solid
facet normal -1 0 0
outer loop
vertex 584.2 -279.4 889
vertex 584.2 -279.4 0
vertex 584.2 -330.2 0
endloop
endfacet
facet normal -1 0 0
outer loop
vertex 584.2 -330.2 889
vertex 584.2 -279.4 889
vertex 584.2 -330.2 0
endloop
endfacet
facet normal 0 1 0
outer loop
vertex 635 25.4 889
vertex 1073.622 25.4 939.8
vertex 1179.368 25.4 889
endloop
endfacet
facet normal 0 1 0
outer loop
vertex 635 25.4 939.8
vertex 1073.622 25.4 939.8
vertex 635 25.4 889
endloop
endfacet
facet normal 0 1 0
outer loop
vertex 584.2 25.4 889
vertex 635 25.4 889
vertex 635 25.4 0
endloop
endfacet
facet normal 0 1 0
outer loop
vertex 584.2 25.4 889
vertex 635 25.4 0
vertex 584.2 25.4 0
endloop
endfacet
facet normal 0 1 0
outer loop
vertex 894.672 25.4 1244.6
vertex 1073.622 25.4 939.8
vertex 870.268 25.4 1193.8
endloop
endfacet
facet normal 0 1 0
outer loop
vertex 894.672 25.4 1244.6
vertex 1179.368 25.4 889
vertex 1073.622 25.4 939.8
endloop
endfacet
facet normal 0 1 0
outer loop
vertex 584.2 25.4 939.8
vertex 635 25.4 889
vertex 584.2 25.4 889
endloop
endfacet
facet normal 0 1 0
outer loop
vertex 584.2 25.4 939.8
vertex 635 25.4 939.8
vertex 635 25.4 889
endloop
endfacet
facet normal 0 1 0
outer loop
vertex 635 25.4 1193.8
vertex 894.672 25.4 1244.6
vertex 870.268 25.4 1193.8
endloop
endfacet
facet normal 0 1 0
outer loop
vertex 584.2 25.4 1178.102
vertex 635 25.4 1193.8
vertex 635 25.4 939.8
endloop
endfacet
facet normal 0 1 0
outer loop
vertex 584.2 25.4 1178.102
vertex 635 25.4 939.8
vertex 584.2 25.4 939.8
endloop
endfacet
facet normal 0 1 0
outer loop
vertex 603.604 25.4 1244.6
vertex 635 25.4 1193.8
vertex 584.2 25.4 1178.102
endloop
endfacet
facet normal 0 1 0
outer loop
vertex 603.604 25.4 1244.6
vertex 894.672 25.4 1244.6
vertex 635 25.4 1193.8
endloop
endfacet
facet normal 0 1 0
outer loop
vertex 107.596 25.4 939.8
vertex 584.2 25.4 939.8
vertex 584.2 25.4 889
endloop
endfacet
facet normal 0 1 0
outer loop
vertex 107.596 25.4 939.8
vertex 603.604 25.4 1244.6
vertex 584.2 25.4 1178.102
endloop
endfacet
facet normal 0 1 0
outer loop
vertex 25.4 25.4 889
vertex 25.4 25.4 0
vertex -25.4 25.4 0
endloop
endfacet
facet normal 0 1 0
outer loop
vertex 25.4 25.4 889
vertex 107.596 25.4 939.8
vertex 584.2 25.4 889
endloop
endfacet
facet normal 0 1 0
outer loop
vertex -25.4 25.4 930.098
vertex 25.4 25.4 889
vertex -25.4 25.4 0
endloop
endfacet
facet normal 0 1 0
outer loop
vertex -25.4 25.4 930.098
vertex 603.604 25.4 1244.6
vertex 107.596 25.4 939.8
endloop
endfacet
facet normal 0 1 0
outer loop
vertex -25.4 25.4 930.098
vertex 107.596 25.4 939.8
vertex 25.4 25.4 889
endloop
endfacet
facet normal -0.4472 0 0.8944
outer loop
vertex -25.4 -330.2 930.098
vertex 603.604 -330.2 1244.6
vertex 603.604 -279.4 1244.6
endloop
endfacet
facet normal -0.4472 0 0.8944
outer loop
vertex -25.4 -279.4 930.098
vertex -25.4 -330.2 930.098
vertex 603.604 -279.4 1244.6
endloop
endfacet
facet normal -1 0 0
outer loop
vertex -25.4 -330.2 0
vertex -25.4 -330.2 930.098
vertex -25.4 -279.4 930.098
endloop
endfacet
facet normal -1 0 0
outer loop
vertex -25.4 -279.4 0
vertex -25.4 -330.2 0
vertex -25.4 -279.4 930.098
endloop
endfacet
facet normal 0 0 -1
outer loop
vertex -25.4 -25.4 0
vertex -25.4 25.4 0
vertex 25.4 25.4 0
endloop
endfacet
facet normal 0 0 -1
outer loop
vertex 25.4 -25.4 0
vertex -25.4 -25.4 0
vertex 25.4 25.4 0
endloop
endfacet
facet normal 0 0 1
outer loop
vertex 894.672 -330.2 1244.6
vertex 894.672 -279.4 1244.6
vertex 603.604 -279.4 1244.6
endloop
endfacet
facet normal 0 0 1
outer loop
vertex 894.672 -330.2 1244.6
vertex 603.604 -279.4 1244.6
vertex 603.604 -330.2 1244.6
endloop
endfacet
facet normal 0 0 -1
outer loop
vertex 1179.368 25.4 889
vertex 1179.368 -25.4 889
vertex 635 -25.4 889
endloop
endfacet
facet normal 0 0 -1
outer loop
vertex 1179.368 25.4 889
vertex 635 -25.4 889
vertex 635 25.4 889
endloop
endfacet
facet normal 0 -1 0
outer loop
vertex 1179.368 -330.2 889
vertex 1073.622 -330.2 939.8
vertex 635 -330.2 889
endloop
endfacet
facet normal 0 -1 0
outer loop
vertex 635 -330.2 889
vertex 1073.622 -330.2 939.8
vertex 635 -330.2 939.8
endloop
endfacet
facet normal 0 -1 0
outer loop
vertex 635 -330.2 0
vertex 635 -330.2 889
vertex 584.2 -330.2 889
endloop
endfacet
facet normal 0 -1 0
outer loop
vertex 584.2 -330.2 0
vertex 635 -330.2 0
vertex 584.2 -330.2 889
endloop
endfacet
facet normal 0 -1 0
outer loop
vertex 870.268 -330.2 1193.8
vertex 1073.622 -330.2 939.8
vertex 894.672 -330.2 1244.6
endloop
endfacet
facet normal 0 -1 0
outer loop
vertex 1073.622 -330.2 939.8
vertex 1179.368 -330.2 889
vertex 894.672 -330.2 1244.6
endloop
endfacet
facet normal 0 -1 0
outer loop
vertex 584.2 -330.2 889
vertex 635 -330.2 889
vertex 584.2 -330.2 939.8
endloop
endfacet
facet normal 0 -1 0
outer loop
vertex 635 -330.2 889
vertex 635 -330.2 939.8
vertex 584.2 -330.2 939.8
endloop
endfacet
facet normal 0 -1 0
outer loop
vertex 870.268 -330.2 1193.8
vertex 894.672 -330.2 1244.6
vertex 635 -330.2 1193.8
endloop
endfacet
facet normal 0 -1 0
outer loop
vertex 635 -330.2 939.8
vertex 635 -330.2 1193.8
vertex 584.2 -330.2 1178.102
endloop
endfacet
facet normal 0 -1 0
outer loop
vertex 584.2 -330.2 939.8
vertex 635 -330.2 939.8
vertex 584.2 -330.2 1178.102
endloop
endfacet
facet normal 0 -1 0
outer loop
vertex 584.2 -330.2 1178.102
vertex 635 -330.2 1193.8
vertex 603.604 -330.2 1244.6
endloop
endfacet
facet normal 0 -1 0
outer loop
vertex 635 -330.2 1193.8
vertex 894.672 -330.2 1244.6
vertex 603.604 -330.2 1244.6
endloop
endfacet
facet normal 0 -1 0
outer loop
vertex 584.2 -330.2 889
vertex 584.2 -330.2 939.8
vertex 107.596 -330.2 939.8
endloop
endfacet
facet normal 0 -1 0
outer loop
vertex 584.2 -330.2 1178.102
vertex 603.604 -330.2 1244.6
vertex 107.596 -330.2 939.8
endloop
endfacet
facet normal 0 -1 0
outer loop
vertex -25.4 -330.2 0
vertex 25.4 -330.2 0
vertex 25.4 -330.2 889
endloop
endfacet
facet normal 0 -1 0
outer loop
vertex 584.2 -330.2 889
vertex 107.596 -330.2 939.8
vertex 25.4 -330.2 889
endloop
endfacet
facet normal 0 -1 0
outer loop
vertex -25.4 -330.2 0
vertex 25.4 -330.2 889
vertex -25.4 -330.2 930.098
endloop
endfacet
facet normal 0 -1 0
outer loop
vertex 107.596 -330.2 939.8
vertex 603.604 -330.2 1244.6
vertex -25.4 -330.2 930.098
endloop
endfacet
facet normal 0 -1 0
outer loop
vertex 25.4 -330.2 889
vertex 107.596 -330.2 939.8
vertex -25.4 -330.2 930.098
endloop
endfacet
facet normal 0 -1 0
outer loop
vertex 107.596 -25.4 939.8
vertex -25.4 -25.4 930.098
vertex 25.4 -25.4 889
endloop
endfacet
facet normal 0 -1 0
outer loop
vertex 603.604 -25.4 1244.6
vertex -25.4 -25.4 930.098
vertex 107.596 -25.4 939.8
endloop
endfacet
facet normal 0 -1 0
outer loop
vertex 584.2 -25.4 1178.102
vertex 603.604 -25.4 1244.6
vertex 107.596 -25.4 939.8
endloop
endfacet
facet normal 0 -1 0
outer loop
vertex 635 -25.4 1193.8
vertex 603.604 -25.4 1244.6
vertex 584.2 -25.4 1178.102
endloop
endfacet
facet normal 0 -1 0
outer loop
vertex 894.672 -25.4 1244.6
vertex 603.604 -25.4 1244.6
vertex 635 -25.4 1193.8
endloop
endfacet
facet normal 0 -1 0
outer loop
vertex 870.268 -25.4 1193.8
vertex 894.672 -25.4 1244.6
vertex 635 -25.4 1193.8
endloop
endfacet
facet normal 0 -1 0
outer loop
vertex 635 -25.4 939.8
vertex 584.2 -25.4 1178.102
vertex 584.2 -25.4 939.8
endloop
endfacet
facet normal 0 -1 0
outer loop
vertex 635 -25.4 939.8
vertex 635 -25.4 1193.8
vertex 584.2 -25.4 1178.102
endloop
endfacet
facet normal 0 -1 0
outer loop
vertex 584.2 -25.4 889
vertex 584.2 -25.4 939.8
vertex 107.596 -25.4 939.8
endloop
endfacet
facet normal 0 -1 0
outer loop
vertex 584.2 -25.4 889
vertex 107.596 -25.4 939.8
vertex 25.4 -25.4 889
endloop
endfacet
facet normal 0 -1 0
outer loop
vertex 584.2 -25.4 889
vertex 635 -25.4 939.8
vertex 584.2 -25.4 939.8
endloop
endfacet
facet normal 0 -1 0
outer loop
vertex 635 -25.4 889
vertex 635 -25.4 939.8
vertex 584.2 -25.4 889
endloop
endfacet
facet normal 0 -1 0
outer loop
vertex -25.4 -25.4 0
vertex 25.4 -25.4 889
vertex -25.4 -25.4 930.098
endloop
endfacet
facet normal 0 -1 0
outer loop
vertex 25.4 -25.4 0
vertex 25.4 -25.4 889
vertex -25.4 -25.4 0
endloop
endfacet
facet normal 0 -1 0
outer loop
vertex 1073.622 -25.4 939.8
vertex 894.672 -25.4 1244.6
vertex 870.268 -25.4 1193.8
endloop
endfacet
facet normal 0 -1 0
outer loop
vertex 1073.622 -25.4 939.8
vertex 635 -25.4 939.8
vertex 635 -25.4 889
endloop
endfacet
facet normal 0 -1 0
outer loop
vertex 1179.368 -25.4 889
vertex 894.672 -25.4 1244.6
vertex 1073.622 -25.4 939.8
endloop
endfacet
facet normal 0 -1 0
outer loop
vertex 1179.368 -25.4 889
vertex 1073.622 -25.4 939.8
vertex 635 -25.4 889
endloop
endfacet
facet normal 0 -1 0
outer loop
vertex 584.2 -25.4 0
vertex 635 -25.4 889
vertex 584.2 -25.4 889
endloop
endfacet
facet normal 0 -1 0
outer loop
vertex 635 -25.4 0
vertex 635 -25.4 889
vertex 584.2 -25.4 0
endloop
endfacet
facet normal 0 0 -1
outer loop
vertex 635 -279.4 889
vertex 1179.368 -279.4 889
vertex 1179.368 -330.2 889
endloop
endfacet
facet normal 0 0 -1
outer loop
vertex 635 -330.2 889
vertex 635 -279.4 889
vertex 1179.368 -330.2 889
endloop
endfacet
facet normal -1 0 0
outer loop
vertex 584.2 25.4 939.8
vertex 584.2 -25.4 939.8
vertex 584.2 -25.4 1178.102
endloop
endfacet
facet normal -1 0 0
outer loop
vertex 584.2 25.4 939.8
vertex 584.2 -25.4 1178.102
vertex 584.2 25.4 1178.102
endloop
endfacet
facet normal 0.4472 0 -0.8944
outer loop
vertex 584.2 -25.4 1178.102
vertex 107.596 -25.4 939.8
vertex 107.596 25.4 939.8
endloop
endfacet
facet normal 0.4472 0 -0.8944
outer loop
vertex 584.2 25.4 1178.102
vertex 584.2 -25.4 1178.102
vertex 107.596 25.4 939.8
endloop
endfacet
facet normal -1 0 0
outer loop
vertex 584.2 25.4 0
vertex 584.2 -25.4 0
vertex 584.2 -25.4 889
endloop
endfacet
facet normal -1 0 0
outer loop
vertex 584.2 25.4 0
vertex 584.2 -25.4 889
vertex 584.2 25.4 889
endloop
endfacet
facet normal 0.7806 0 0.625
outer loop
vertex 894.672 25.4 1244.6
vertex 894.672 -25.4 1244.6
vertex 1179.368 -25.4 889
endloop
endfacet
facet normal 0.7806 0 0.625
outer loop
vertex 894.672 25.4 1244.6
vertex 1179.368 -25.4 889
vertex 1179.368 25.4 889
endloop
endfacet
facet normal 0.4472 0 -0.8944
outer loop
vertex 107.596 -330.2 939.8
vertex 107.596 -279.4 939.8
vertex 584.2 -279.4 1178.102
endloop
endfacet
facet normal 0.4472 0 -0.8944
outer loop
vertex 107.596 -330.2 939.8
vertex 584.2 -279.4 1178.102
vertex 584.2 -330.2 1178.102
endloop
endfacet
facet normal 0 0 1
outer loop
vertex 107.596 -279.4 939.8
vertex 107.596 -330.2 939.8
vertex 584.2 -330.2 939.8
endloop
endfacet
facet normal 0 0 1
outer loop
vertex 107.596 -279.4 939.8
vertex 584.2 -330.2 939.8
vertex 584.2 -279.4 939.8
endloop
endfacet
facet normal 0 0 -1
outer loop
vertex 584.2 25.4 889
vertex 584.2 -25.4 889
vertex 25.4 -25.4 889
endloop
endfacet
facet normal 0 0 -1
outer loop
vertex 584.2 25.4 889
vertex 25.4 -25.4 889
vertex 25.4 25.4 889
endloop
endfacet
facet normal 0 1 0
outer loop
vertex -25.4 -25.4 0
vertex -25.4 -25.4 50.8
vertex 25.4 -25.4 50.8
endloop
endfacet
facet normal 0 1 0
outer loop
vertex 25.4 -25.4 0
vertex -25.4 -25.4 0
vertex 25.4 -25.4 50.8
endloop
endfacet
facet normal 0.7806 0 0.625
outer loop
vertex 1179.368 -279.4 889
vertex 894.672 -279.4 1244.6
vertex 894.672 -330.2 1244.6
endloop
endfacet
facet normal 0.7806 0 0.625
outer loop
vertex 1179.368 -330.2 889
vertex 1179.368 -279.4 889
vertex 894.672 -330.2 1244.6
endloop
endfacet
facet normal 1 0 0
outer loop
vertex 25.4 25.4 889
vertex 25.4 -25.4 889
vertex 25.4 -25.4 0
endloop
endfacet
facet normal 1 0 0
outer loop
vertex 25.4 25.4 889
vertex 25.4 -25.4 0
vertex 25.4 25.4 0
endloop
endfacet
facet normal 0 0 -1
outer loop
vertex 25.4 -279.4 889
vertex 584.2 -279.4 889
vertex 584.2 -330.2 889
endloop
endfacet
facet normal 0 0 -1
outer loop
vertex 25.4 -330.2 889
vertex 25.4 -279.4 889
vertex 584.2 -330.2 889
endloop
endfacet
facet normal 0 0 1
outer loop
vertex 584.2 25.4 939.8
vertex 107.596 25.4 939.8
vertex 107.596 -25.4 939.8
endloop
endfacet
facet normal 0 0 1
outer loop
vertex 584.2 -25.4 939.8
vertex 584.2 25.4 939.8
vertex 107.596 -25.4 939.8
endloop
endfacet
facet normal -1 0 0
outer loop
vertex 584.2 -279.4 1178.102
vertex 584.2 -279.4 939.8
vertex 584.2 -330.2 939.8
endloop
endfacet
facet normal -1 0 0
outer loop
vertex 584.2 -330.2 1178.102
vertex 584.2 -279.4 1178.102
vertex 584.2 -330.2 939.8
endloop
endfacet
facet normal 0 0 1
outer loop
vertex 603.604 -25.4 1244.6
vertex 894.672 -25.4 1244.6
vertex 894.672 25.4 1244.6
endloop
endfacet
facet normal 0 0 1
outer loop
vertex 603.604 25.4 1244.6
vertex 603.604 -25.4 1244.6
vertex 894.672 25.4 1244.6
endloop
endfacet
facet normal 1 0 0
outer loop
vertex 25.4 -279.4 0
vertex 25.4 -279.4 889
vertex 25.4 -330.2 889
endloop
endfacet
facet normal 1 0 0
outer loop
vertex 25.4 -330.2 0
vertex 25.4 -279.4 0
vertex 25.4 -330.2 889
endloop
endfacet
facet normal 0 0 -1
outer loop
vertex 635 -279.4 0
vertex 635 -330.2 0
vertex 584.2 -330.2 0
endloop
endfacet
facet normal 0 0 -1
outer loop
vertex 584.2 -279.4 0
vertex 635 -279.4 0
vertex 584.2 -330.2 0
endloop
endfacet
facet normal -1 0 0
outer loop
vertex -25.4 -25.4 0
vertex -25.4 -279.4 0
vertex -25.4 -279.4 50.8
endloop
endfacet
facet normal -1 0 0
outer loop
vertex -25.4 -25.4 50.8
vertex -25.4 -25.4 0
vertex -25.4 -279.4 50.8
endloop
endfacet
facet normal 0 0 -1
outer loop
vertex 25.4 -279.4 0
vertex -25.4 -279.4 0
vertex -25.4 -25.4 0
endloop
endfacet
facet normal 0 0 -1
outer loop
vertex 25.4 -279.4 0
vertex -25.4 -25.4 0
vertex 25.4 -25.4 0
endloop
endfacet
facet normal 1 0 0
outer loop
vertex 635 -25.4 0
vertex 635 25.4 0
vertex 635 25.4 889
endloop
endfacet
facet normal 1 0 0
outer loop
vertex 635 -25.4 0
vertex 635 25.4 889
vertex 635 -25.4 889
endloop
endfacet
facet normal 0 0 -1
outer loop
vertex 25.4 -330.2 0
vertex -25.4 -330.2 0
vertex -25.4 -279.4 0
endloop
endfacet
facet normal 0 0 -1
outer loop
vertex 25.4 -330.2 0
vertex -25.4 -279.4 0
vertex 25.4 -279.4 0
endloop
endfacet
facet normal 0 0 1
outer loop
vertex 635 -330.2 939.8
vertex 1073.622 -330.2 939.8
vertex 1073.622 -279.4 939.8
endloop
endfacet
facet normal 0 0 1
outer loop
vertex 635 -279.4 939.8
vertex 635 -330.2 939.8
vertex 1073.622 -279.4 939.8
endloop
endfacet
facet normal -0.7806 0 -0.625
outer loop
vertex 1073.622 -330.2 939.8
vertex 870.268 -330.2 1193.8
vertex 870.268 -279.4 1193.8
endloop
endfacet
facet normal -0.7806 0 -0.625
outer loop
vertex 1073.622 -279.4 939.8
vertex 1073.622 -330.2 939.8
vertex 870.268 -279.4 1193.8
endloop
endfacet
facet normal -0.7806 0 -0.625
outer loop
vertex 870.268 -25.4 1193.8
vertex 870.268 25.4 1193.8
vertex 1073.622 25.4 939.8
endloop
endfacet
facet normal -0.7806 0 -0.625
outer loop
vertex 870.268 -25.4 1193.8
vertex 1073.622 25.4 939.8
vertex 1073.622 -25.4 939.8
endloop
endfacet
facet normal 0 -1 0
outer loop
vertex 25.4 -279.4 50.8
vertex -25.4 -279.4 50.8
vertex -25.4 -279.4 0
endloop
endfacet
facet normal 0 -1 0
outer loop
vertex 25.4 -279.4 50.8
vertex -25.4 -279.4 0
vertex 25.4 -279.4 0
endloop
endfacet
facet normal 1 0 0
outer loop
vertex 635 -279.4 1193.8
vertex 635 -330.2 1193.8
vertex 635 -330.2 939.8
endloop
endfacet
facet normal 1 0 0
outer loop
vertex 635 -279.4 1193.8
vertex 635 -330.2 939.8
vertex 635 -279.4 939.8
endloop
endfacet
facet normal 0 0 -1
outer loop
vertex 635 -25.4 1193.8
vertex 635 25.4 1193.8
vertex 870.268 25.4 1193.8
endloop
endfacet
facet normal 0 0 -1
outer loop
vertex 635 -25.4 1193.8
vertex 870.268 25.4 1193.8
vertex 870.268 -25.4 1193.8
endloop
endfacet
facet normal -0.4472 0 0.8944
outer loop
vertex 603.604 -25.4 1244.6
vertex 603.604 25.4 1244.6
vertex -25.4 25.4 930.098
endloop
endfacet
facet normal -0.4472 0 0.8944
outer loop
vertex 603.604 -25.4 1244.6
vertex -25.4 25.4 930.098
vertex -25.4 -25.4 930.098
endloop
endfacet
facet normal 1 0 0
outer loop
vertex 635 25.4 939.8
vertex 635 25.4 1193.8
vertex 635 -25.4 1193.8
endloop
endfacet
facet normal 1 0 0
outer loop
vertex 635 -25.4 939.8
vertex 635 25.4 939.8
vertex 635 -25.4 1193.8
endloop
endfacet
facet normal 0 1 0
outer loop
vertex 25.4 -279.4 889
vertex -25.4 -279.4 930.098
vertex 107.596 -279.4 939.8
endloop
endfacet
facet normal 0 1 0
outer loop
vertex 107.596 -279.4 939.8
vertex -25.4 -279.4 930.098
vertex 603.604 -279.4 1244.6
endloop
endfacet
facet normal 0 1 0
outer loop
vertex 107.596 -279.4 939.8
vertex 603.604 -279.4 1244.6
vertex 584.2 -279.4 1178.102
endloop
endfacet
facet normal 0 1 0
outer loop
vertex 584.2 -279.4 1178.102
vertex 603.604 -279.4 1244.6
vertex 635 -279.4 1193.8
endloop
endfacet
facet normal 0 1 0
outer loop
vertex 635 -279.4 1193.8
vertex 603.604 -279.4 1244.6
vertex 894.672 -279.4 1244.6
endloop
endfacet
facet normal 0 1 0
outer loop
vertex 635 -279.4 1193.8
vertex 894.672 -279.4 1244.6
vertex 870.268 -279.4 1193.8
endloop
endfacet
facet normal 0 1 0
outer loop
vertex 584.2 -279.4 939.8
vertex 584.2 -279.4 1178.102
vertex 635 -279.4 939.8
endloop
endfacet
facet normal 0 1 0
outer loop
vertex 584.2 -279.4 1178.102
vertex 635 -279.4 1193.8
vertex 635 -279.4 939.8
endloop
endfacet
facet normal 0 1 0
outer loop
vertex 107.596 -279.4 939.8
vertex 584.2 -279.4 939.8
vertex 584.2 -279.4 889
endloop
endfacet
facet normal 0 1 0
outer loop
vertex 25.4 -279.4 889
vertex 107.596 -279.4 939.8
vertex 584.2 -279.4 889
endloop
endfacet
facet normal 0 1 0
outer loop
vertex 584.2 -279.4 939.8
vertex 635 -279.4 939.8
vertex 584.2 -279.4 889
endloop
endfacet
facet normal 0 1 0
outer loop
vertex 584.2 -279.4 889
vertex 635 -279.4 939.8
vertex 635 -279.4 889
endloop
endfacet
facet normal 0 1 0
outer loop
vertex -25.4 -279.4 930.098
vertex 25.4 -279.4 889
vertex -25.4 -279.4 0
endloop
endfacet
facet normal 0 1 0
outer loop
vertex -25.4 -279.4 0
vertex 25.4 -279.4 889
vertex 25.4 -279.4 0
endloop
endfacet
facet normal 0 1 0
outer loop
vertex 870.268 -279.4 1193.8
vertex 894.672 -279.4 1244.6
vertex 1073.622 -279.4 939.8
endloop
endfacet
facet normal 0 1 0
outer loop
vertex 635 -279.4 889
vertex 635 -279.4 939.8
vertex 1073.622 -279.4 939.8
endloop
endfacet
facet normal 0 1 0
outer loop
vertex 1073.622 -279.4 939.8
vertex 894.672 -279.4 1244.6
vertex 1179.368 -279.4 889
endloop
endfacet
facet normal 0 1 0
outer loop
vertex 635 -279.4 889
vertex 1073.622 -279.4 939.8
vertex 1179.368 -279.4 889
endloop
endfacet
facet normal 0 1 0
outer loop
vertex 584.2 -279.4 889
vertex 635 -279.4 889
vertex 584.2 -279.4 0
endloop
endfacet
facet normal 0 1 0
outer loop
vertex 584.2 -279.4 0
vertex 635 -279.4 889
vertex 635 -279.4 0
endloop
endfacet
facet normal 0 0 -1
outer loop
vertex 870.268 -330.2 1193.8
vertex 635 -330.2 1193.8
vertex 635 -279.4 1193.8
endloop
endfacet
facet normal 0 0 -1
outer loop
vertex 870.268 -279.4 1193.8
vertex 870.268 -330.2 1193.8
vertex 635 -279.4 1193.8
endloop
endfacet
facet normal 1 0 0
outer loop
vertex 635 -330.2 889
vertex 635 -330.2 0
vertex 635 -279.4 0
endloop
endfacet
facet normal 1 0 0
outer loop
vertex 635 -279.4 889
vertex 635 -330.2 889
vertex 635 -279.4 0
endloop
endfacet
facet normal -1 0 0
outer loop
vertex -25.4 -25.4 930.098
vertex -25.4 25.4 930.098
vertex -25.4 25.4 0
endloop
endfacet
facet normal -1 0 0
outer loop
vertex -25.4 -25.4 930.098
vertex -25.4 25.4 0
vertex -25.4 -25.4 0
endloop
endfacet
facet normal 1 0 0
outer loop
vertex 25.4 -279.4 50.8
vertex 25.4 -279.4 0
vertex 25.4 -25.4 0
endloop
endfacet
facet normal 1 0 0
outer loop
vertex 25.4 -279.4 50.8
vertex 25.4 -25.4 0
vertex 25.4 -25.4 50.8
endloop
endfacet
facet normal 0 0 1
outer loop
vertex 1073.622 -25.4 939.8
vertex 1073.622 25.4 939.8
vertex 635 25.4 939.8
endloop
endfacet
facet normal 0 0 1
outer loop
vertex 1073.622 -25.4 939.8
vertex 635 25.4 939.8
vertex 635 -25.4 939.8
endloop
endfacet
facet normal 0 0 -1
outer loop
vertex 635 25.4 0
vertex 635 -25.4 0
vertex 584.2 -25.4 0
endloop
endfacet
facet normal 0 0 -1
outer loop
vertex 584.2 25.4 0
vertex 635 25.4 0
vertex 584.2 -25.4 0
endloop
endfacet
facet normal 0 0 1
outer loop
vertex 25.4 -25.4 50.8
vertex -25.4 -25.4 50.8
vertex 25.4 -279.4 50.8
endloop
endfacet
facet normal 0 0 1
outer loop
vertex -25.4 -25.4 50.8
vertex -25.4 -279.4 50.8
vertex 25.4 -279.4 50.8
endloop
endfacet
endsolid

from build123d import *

# Parameters (mm, degrees)
F1_W           = 50.8
F1_H           = 50.8
F3_W           = 50.8
F3_H           = 50.8
F6_DEPTH       = 25.401
F6_DEPTH_BACK  = 25.401
F9_W           = 50.8
F9_H           = 50.8
F10_DEPTH      = 127
F10_DEPTH_BACK = 127


with BuildPart() as f2:
    # F2: sweep along a path in F0
    with BuildLine(Plane.XZ) as f2_path:
        Line((0, 0), (0, 914.4))
        Line((0, 914.4), (609.6, 1219.2))
        Line((609.6, 1219.2), (609.6, 0))
    # F1 (on Top) → F2 (sweep)
    with BuildSketch(Plane.XY):
        Rectangle(F1_W, F1_H)
    sweep(path=f2_path.line, transition=Transition.RIGHT)

    # F4: sweep along a path in F0
    with BuildLine(Plane.XZ) as f4_path:
        Line((0, 914.4), (609.6, 914.4))
        Line((609.6, 914.4), (1126.4953613281, 914.4))
        Line((1126.4953613281, 914.4), (882.4702501297, 1219.2))
        Line((882.4702501297, 1219.2), (609.6, 1219.2))
    # F3 (on Right) → F4 (sweep)
    with BuildSketch(Plane.YZ):
        with Locations((0, 914.4)):
            Rectangle(F3_W, F3_H)
    sweep(path=f4_path.line, transition=Transition.RIGHT)

    # F5 (on Front) → F6 (cut, two sides)
    with BuildSketch(Plane.XZ) as f6_sk:
        Polygon((603.6038733715, 1244.6), (635, 1244.6), (635, 1260.2980633142), align=None)
    extrude(amount=-F6_DEPTH, mode=Mode.SUBTRACT)
    extrude(f6_sk.sketch, amount=F6_DEPTH_BACK, mode=Mode.SUBTRACT)


with BuildPart() as f8_1:
    # F8: instance of F2
    add(f2.part.mirror(Plane.XZ.offset(152.4)))


with BuildPart() as f10:
    # F9 (on offset) → F10 (new body, two sides)
    with BuildSketch(Plane.XZ.offset(152.4)) as f10_sk:
        with Locations((0, 25.4)):
            Rectangle(F9_W, F9_H)
    extrude(amount=F10_DEPTH)
    extrude(f10_sk.sketch, amount=-F10_DEPTH_BACK)


solid = Compound([f2.part, f8_1.part, f10.part])
